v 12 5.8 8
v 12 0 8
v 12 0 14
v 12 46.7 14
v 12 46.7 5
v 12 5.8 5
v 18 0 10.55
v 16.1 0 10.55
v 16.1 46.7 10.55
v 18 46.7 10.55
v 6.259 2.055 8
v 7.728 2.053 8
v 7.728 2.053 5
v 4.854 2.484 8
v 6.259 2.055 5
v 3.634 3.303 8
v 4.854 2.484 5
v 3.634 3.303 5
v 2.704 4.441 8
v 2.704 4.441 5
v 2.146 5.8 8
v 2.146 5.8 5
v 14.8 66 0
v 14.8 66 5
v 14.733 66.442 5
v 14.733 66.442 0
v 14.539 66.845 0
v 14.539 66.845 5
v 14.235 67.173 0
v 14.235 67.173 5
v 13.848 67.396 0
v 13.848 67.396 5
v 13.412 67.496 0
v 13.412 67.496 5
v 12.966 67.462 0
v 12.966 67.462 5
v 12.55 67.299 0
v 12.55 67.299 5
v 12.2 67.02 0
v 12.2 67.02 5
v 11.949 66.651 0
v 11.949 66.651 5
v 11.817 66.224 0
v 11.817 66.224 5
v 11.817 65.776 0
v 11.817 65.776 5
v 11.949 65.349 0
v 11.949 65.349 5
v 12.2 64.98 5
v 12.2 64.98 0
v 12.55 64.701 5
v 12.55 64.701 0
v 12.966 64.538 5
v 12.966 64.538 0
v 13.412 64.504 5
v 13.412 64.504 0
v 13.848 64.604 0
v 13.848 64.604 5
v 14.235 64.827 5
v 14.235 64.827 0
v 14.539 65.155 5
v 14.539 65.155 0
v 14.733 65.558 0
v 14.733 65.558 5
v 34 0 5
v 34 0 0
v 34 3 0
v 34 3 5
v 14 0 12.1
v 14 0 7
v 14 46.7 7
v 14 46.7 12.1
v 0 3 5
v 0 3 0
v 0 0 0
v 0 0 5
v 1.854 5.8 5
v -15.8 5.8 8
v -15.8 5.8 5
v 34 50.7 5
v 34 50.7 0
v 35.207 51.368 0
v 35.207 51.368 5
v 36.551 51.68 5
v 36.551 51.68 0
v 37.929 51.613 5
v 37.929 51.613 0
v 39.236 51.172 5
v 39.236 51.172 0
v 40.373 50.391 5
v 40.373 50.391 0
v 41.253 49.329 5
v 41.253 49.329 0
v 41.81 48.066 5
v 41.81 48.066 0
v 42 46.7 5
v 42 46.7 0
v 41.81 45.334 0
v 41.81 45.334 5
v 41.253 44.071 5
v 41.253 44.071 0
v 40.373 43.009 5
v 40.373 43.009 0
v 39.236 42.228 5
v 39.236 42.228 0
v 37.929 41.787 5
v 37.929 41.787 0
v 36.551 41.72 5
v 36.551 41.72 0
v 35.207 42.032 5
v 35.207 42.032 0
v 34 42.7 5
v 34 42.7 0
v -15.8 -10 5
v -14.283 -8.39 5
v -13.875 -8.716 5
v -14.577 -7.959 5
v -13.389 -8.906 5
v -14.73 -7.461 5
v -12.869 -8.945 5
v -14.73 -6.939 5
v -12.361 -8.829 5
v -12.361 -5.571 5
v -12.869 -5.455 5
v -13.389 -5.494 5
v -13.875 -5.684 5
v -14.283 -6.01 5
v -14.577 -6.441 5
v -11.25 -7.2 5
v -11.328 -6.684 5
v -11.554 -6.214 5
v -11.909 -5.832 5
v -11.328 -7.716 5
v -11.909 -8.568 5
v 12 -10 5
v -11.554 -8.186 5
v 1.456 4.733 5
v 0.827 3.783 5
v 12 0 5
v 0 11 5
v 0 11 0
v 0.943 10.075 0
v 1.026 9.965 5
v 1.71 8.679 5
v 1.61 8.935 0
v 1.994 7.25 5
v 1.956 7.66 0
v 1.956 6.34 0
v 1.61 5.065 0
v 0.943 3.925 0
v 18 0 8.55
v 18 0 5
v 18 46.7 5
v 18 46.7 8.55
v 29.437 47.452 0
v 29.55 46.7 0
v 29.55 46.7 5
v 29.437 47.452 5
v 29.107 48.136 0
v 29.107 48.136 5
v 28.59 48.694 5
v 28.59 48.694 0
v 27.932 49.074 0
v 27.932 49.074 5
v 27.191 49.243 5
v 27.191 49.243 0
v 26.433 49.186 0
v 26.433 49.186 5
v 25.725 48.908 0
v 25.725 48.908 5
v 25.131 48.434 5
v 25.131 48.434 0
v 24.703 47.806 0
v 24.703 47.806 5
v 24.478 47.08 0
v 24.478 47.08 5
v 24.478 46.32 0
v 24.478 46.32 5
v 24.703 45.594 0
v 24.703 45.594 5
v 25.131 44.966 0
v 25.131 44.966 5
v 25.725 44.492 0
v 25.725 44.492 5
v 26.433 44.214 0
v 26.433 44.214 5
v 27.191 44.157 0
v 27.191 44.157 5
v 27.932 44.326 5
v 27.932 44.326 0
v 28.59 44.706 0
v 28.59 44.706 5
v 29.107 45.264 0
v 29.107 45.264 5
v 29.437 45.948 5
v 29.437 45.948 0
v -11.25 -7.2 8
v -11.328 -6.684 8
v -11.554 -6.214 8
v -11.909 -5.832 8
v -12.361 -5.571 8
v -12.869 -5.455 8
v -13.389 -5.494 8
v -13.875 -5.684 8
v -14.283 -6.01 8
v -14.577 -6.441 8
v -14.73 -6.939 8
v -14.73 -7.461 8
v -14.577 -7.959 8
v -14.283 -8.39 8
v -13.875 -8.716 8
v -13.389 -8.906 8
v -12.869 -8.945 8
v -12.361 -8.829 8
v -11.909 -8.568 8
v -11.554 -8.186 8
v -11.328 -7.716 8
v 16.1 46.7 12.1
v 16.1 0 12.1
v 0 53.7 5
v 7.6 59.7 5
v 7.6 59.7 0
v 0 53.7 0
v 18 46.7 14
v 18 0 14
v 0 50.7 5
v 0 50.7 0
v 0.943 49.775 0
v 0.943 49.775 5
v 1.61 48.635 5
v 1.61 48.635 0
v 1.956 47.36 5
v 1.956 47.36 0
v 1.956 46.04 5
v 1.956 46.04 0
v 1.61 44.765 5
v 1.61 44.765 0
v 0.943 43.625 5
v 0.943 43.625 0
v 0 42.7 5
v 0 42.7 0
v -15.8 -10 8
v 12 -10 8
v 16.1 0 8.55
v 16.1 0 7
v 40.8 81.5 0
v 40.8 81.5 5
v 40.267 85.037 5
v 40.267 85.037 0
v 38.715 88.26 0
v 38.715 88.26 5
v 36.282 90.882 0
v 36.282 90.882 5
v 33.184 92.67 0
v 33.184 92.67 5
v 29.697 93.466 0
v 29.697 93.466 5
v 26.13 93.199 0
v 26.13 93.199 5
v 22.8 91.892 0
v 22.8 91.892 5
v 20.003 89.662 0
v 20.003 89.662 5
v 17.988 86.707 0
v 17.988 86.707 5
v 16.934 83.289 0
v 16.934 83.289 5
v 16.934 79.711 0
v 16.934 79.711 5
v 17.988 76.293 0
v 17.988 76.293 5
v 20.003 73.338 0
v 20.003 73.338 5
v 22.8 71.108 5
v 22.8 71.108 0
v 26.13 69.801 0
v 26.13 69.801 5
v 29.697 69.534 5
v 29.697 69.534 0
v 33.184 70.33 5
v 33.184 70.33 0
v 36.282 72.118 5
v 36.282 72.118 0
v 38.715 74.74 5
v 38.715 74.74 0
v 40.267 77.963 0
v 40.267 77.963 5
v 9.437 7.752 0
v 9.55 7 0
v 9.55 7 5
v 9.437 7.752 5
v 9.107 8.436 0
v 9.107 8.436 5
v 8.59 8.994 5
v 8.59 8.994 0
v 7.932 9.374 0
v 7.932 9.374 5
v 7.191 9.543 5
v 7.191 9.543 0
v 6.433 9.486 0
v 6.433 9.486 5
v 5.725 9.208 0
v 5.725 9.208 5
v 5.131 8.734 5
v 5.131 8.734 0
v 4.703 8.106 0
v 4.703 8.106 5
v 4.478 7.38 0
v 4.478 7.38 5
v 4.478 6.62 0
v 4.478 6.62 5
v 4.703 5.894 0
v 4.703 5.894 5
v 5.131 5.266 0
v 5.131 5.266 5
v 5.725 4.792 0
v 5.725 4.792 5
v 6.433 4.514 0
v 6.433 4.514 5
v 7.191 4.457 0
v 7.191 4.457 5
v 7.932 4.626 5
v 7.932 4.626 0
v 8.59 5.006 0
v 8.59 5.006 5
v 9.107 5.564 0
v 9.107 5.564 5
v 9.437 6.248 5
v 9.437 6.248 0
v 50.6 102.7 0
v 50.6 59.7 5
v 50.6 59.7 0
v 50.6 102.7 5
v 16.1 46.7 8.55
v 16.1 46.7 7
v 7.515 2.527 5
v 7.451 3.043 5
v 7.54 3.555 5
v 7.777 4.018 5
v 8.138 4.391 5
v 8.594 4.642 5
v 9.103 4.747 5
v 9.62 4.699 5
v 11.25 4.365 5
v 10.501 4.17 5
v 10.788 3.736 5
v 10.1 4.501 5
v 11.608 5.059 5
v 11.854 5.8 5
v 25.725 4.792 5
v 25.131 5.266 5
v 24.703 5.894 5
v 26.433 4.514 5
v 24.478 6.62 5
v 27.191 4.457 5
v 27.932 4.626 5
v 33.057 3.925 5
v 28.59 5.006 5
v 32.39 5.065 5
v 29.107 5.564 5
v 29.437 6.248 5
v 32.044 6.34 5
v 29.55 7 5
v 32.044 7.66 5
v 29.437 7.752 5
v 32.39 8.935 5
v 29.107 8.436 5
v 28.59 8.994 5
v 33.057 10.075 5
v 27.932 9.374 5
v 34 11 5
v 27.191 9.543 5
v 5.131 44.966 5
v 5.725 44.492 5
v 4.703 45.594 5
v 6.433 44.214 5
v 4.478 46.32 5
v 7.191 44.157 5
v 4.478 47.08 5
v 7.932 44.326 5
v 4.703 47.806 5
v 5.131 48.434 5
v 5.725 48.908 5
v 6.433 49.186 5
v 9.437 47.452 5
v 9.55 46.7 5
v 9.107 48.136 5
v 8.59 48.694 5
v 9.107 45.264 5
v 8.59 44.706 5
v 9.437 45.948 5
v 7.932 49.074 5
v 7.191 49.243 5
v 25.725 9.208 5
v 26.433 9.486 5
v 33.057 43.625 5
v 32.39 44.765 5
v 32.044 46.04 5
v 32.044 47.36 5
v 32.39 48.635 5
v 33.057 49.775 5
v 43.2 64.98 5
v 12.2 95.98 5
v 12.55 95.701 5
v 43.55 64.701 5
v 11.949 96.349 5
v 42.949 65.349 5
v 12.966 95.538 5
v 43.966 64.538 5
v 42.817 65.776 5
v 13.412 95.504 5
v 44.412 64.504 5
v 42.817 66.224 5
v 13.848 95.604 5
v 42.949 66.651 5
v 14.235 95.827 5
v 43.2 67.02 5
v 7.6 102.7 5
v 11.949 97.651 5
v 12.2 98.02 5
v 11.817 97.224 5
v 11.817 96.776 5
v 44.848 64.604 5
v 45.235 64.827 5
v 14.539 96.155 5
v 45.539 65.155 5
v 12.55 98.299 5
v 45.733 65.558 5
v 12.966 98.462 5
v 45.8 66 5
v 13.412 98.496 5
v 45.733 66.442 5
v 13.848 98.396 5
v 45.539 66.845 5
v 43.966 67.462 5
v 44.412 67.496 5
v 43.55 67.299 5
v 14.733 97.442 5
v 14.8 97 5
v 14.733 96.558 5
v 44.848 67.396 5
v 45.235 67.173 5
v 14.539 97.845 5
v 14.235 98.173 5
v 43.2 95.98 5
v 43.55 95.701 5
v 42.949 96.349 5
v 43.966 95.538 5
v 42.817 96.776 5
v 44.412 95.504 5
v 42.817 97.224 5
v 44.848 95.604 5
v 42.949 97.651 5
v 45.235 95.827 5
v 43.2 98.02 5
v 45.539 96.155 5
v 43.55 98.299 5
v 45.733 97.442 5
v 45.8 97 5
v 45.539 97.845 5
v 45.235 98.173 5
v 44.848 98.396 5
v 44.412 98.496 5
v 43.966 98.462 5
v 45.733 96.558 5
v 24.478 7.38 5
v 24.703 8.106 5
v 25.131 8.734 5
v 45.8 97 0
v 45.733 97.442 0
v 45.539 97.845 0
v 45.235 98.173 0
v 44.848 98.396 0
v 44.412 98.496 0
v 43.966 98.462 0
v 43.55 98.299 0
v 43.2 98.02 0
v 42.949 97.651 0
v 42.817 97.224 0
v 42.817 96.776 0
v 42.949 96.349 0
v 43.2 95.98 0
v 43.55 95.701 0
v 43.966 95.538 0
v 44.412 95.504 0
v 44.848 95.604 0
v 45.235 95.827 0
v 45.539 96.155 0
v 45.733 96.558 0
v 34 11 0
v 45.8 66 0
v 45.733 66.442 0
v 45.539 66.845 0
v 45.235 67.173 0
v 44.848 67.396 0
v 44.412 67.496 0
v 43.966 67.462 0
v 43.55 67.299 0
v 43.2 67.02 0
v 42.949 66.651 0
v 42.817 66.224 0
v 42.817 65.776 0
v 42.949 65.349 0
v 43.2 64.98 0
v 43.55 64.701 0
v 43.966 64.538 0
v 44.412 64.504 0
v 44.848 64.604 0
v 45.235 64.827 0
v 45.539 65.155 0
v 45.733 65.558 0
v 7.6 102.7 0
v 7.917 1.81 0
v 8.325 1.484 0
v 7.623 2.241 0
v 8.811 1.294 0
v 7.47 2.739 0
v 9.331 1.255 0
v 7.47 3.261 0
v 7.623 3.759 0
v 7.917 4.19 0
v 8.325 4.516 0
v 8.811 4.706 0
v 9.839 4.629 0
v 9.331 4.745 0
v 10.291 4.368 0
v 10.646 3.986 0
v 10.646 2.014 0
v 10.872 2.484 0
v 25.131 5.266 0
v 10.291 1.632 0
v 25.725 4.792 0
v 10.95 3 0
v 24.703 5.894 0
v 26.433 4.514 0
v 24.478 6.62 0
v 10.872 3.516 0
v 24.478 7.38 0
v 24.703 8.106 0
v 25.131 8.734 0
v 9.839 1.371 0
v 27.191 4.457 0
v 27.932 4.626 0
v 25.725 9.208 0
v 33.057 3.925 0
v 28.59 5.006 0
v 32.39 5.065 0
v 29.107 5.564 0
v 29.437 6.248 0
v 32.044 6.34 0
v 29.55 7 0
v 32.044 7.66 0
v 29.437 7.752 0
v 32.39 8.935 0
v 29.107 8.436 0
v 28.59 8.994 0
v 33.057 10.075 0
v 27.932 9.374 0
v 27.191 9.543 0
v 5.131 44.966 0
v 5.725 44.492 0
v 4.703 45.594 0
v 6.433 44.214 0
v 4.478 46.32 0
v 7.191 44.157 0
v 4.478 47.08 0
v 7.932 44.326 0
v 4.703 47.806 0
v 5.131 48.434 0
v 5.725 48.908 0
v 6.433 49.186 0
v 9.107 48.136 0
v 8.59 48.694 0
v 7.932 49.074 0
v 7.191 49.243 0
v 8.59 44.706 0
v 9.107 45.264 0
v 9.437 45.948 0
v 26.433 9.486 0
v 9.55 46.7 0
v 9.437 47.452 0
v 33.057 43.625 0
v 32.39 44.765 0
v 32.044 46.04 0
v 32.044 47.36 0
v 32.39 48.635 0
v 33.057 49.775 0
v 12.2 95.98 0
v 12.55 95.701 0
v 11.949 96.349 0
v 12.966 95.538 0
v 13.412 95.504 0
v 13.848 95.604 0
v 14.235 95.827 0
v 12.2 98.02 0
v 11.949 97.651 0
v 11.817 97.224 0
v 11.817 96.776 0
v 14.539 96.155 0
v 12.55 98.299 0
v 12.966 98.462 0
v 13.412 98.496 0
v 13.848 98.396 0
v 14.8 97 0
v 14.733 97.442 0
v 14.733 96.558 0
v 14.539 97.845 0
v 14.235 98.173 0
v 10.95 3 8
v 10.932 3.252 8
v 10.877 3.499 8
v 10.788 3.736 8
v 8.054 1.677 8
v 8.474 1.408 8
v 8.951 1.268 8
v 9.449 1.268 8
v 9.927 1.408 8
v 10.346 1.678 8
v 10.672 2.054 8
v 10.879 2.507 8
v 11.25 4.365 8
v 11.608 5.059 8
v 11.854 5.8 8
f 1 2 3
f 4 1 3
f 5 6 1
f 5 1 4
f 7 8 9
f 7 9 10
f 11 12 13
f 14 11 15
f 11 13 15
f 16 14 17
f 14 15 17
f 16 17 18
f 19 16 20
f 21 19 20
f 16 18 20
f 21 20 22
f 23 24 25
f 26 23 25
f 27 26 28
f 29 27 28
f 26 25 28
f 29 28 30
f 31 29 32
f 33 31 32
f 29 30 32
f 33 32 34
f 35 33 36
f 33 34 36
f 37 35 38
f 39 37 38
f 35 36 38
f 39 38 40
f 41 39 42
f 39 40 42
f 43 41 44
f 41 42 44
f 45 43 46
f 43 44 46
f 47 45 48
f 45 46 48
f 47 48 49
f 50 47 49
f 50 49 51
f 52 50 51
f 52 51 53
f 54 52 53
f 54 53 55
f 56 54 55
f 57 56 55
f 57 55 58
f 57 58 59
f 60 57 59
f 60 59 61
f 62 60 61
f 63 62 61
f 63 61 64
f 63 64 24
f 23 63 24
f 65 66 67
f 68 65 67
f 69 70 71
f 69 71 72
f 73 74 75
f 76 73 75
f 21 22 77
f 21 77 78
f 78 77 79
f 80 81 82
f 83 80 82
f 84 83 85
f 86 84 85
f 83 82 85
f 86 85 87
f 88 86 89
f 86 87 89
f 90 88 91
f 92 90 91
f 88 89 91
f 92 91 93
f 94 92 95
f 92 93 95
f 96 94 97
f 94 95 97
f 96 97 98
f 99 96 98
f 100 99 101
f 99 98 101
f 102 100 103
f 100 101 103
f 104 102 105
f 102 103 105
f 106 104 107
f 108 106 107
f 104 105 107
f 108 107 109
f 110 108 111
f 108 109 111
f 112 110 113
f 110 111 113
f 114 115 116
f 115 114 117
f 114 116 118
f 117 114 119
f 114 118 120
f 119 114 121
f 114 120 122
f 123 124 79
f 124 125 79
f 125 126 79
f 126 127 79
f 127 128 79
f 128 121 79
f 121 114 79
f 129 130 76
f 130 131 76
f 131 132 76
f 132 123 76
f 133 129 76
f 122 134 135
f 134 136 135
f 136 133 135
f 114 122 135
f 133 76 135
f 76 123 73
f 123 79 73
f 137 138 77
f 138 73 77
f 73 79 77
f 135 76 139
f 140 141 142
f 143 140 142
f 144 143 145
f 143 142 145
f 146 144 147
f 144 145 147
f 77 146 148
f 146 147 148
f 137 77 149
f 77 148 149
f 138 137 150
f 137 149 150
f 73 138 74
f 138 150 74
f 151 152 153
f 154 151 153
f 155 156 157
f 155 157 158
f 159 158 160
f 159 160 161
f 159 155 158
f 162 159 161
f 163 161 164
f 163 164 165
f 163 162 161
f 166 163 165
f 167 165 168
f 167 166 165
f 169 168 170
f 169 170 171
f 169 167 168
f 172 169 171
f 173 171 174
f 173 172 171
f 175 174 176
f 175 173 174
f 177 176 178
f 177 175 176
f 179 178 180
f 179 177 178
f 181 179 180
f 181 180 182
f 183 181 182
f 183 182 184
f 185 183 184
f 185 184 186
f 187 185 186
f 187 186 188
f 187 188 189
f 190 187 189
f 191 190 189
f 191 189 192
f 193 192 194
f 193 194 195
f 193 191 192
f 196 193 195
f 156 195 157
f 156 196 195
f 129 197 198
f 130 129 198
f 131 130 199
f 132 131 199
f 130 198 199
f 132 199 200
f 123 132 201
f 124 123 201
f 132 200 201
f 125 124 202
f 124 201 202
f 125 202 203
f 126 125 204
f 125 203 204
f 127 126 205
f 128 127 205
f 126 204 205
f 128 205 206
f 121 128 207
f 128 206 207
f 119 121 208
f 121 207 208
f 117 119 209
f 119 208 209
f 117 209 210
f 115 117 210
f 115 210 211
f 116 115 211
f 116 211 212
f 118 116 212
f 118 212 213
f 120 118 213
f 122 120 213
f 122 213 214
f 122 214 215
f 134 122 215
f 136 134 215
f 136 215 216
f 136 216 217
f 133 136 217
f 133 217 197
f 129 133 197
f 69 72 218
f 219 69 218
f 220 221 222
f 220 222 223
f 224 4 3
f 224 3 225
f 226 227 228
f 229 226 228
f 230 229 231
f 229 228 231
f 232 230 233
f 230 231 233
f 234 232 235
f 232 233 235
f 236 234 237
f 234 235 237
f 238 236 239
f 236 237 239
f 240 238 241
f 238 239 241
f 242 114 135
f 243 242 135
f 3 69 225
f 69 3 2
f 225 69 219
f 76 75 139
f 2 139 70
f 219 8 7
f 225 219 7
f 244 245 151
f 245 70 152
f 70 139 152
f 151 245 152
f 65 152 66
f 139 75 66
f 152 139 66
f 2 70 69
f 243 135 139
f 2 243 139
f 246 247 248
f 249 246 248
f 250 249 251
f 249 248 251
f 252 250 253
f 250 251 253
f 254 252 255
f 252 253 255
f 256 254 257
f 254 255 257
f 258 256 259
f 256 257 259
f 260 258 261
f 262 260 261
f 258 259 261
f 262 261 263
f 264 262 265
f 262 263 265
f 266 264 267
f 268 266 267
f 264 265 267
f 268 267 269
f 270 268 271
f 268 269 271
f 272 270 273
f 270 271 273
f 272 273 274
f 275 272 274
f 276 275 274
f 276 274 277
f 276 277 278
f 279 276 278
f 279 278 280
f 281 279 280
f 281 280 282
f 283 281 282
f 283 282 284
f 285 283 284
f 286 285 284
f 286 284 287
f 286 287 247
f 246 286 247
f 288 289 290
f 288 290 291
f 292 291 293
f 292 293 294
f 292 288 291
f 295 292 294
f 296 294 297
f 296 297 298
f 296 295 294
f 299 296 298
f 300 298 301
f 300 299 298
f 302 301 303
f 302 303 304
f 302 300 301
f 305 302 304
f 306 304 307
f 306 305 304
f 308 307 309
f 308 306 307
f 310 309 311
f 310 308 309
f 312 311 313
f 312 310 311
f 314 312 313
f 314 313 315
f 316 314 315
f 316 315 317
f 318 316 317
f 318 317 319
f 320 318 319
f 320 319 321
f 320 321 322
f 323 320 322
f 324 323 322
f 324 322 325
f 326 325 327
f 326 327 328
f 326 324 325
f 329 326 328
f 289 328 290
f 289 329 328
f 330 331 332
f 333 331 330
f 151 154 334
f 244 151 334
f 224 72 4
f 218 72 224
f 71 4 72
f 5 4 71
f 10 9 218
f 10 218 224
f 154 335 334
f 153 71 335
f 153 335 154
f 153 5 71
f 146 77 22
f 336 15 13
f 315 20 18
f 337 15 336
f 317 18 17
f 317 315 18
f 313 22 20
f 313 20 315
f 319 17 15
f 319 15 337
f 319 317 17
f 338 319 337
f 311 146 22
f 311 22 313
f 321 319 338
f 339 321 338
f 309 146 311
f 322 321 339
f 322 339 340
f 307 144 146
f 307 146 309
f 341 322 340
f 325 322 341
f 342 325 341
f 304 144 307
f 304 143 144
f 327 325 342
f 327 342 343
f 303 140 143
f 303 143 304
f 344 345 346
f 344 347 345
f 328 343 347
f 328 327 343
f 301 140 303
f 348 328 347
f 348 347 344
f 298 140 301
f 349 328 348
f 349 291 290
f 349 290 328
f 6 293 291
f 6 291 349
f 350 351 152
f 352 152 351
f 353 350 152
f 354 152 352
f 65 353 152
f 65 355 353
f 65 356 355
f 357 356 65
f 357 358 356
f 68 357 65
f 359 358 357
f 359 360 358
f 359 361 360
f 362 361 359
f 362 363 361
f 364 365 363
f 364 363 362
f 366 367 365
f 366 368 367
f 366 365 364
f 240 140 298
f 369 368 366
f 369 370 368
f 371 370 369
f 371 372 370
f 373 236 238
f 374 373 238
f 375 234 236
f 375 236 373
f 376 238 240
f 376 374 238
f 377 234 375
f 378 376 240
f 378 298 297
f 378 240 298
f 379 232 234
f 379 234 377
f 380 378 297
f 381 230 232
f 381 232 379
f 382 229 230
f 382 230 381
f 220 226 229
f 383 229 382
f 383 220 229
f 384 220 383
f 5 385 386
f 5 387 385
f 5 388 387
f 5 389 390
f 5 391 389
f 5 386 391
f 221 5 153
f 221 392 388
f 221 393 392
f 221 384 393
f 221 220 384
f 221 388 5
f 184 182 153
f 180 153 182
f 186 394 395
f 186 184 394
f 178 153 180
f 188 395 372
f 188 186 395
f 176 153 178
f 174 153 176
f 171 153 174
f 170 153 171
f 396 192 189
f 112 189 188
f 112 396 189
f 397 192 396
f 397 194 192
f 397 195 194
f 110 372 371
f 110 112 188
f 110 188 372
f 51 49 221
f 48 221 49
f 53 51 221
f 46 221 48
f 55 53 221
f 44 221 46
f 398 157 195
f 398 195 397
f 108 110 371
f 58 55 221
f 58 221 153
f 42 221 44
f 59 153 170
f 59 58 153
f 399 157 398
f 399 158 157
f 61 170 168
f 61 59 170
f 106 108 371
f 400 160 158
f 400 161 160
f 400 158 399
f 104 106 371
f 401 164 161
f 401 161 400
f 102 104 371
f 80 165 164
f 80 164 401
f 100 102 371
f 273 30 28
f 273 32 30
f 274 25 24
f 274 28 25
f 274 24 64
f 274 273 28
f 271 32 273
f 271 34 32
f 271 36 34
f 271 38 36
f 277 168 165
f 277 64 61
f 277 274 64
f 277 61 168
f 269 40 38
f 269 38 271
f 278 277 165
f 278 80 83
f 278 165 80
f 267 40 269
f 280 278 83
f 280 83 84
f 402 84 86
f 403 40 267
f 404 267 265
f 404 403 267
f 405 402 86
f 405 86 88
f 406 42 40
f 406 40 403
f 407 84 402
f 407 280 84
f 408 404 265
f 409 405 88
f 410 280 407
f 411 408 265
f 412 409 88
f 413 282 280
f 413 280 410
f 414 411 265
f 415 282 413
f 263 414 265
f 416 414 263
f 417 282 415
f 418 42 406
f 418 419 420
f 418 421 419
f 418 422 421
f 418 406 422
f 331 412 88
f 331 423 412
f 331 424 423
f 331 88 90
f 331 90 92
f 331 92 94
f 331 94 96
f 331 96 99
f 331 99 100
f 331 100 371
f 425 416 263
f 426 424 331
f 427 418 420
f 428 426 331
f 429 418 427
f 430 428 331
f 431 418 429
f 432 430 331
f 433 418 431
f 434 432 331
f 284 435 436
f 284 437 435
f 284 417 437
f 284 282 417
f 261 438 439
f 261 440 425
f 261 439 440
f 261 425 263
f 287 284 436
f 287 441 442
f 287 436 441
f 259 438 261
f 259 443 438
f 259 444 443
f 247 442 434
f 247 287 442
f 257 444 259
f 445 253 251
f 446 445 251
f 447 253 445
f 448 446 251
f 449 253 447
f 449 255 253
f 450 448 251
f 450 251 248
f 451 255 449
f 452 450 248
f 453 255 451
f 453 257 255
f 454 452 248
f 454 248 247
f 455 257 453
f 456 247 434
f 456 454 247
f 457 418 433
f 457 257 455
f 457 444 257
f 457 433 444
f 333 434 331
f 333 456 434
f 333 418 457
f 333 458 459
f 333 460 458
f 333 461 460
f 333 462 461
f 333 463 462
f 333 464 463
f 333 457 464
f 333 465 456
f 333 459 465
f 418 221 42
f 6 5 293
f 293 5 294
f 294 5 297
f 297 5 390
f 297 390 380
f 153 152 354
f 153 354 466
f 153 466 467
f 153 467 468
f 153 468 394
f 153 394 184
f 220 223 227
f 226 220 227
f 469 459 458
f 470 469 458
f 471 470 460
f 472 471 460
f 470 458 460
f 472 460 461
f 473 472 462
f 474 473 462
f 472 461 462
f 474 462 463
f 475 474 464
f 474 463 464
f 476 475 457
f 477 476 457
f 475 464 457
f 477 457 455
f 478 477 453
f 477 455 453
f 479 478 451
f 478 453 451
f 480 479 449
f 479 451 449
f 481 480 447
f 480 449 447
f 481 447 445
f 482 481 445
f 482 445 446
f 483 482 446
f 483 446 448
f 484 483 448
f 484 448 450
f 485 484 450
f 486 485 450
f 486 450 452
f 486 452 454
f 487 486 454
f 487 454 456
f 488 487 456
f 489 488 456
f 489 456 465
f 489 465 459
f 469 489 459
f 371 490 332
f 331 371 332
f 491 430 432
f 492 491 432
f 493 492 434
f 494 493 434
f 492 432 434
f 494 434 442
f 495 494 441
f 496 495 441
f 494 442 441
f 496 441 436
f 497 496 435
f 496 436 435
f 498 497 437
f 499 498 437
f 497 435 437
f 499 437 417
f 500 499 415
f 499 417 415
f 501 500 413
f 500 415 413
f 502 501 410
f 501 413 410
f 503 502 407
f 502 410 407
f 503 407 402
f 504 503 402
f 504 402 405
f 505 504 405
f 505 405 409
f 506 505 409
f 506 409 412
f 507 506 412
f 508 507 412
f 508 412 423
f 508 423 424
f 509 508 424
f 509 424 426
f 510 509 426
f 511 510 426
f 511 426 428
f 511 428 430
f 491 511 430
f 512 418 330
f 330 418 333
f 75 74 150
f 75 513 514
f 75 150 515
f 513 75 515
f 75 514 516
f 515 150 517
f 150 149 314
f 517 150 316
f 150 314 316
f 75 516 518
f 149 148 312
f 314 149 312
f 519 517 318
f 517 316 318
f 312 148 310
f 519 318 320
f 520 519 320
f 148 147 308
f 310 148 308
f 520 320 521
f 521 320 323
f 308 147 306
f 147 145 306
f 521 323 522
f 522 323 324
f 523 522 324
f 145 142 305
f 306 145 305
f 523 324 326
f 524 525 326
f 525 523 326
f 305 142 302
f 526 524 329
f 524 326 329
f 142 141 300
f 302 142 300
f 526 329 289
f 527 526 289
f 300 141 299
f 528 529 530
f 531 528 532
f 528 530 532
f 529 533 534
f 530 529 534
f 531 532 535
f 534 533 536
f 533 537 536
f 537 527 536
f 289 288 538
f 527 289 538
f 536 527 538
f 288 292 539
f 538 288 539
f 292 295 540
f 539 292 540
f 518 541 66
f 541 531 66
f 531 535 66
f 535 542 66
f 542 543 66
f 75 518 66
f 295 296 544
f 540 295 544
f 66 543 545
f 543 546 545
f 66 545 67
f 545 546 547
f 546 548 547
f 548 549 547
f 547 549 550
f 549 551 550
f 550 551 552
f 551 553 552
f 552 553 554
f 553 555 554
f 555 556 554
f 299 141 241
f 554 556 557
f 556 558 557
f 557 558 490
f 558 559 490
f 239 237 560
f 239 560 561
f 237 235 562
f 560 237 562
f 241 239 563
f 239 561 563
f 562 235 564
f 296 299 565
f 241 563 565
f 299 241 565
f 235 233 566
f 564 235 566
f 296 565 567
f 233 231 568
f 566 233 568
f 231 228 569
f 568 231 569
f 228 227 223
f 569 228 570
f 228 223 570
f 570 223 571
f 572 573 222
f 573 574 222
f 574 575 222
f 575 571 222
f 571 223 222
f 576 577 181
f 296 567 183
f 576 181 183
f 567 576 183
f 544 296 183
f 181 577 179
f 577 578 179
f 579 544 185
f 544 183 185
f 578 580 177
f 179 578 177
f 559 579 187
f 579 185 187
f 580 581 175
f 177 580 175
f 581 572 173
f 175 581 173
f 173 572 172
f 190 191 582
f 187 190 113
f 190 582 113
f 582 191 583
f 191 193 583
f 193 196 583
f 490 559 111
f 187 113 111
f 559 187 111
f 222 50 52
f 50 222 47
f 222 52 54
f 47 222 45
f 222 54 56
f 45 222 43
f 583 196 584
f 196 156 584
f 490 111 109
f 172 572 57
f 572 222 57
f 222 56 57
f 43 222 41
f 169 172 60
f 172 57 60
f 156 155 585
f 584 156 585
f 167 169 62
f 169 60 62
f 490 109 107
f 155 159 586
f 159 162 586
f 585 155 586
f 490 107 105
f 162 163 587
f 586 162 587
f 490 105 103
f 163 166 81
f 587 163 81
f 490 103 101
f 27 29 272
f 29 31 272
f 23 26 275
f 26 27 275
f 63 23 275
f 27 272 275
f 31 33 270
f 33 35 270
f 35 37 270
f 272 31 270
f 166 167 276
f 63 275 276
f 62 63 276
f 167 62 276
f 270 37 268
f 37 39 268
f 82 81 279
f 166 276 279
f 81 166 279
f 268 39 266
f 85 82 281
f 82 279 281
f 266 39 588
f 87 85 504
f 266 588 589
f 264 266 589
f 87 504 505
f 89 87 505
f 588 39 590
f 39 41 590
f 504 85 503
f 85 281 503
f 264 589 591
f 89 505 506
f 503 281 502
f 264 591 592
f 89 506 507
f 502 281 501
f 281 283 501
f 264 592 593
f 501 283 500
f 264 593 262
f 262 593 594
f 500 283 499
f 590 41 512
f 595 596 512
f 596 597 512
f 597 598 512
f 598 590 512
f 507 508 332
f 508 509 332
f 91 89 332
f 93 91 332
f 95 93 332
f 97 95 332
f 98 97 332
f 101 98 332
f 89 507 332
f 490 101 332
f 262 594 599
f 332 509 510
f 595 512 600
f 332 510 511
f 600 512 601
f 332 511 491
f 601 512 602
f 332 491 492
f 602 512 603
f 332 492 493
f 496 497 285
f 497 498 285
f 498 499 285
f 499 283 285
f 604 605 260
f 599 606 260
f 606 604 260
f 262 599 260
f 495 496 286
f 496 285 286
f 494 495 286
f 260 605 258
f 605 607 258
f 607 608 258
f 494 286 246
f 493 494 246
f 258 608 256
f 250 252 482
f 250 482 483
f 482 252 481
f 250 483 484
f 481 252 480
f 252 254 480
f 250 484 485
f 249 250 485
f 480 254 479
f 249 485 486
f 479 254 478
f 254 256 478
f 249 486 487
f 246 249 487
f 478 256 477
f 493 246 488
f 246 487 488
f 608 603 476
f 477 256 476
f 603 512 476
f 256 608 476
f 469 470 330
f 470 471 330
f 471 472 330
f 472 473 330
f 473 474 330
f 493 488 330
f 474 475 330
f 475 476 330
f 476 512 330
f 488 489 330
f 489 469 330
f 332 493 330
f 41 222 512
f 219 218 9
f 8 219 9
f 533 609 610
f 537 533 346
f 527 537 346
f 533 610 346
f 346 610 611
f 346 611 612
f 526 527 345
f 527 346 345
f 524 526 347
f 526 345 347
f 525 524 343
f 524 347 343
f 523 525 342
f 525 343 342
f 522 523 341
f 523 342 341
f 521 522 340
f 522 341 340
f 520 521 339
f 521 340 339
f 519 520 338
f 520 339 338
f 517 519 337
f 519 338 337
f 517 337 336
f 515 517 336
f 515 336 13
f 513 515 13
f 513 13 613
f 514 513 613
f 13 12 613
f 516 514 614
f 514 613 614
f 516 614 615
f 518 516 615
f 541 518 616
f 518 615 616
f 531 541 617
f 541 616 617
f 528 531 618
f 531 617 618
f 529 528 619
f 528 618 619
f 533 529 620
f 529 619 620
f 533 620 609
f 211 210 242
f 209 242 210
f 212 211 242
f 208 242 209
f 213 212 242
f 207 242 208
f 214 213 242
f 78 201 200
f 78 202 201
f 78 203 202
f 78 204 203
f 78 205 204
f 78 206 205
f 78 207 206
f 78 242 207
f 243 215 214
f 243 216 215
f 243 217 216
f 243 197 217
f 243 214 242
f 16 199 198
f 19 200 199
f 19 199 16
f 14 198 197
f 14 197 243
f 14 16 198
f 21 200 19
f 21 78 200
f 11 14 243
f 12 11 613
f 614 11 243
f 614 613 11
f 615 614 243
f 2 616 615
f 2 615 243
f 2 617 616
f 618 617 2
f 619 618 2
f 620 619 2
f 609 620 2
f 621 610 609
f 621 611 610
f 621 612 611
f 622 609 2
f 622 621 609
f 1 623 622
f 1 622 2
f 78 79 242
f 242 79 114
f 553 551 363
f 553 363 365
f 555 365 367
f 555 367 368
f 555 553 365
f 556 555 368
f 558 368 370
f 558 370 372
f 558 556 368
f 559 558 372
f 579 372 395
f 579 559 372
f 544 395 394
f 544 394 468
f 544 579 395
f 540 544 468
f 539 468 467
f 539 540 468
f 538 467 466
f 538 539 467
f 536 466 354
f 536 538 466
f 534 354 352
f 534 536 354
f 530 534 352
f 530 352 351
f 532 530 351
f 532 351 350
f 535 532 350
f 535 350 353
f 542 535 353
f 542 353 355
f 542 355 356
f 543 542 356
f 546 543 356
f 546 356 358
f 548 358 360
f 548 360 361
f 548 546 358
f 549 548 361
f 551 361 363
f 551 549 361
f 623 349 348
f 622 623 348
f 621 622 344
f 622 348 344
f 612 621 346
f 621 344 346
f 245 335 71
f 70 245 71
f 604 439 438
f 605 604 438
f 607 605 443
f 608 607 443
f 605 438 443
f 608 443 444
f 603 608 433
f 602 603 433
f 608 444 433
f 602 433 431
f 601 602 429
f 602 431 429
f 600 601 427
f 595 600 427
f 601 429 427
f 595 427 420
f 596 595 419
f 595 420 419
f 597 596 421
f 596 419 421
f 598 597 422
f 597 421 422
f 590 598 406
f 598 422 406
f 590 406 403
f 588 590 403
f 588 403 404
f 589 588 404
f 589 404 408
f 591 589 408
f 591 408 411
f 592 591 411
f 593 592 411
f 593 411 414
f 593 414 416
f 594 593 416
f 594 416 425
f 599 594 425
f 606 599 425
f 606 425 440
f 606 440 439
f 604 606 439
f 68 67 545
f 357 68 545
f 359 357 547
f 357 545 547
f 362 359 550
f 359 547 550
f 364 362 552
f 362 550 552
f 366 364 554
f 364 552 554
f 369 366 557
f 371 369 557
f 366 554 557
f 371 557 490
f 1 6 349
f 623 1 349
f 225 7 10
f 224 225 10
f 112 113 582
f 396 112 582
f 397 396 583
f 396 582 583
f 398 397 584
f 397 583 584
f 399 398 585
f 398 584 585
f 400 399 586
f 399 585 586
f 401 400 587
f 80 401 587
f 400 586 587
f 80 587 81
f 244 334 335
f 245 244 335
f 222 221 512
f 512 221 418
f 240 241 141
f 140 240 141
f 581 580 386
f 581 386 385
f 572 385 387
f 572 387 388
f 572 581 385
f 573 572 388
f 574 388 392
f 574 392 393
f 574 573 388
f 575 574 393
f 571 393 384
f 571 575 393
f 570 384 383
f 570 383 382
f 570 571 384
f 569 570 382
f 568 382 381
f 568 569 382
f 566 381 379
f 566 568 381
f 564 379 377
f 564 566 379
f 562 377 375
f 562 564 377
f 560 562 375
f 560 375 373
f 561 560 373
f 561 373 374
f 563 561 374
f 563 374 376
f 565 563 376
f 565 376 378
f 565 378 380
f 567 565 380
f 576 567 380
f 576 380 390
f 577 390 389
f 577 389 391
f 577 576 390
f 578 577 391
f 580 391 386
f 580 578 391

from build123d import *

# Parameters (mm, degrees)
SKETCH1_R               = 2.55
BOSS_EXTRUDE1_DEPTH     = 5
SKETCH2_W               = 6
SKETCH2_H               = 46.7
BOSS_EXTRUDE2_DEPTH     = 9
BOSS_EXTRUDE3_DEPTH     = 3
SKETCH4_R               = 1.75
CUT_EXTRUDE1_DEPTH      = 65.060049953
CUT_EXTRUDE2_DEPTH      = 68.578768855
CUT_EXTRUDE2_DEPTH_BACK = 68.578768855
SKETCH6_W               = 43
SKETCH6_H               = 43
BOSS_EXTRUDE4_DEPTH     = 5
SKETCH8_R               = 1.5
SKETCH8_R_2             = 12
CUT_EXTRUDE3_DEPTH      = 115.841847773
BOSS_EXTRUDE5_START     = -5
BOSS_EXTRUDE5_DEPTH     = 5


with BuildPart() as part:
    # Sketch1 → Boss-Extrude1 (new body)
    with BuildSketch(Plane.XY):
        with BuildLine():
            Line((0, 0), (34, 0))
            Line((34, 0), (34, 3))
            ThreePointArc((34, 3), (32, 7), (34, 11))
            Line((34, 11), (34, 42.7))
            ThreePointArc((34, 42.7), (32, 46.7), (34, 50.7))
            Line((34, 50.7), (34, 53.7))
            Line((34, 53.7), (0, 53.7))
            Line((0, 53.7), (0, 50.7))
            ThreePointArc((0, 50.7), (2, 46.7), (0, 42.7))
            Line((0, 42.7), (0, 11))
            ThreePointArc((0, 11), (2, 7), (0, 3))
            Line((0, 3), (0, 0))
        make_face()
        with Locations((7, 46.7)):
            Circle(SKETCH1_R, mode=Mode.SUBTRACT)
        with Locations((27, 46.7)):
            Circle(SKETCH1_R, mode=Mode.SUBTRACT)
        with Locations((7, 7)):
            Circle(SKETCH1_R, mode=Mode.SUBTRACT)
        with Locations((27, 7)):
            Circle(SKETCH1_R, mode=Mode.SUBTRACT)
    extrude(amount=BOSS_EXTRUDE1_DEPTH)

    # Sketch2 → Boss-Extrude2 (add)
    with BuildSketch(Plane.XY.offset(5)):
        with Locations((15, 23.35)):
            Rectangle(SKETCH2_W, SKETCH2_H)
    extrude(amount=BOSS_EXTRUDE2_DEPTH)

    # Sketch3 → Boss-Extrude3 (add)
    with BuildSketch(Plane.XY.offset(5)):
        with BuildLine():
            Line((12, -10), (12, 5.8))
            Line((12, 5.8), (11.85386444, 5.8))
            ThreePointArc((11.85386444, 5.8), (7, 2), (2.14613556, 5.8))
            Line((2.14613556, 5.8), (-15.8, 5.8))
            Line((-15.8, 5.8), (-15.8, -10))
            Line((-15.8, -10), (12, -10))
        make_face()
    extrude(amount=BOSS_EXTRUDE3_DEPTH)

    # Sketch4 → Cut-Extrude1 (cut, through all)
    with BuildSketch(Plane.XY.offset(8)):
        with Locations((9.2, 3)):
            Circle(SKETCH4_R)
        with Locations((-13, -7.2)):
            Circle(SKETCH4_R)
    extrude(amount=-CUT_EXTRUDE1_DEPTH, mode=Mode.SUBTRACT)

    # Sketch5 → Cut-Extrude2 (cut, two sides: drawn at the far end of the back side and taken through both)
    with BuildSketch(Plane(origin=(0, 46.7, 0), x_dir=(1, 0, 0), z_dir=(0, 1, 0)).offset(-CUT_EXTRUDE2_DEPTH_BACK)):
        Polygon((98.816452891, -8.55), (18, -8.55), (16.1, -8.55), (16.1, -7), (14, -7), (14, -12.1), (16.1, -12.1), (16.1, -10.55), (18, -10.55), (98.816452891, -10.55), (260.449358672, -10.55), (260.449358672, -8.55), align=None)
    extrude(amount=CUT_EXTRUDE2_DEPTH + CUT_EXTRUDE2_DEPTH_BACK, mode=Mode.SUBTRACT)

    # Sketch6 → Boss-Extrude4 (add, through all)
    with BuildSketch(Plane.XY.offset(5)):
        with Locations((29.1, 81.2)):
            Rectangle(SKETCH6_W, SKETCH6_H)
        Polygon((34, 53.7), (50.6, 59.7), (7.6, 59.7), (0, 53.7), align=None)
    extrude(amount=-BOSS_EXTRUDE4_DEPTH)

    # Sketch8 → Cut-Extrude3 (cut, through all)
    with BuildSketch(Plane.XY.offset(5)):
        with Locations((13.3, 97)):
            Circle(SKETCH8_R)
        with Locations((44.3, 97)):
            Circle(SKETCH8_R)
        with Locations((13.3, 66)):
            Circle(SKETCH8_R)
        with Locations((44.3, 66)):
            Circle(SKETCH8_R)
        with Locations((28.8, 81.5)):
            Circle(SKETCH8_R_2)
    extrude(amount=-CUT_EXTRUDE3_DEPTH, mode=Mode.SUBTRACT)

    # Sketch9 → Boss-Extrude5 (add)
    with BuildSketch(Plane.XY.offset(5).offset(BOSS_EXTRUDE5_START)):
        with BuildLine():
            Line((34, 11), (50.6, 59.7))
            Line((50.6, 59.7), (34, 53.7))
            Line((34, 53.7), (34, 50.7))
            ThreePointArc((34, 50.7), (39.236067977, 51.172135955), (42, 46.7))
            ThreePointArc((42, 46.7), (39.236067977, 42.227864045), (34, 42.7))
            Line((34, 42.7), (34, 11))
        make_face()
    extrude(amount=BOSS_EXTRUDE5_DEPTH)


solid = part.part
